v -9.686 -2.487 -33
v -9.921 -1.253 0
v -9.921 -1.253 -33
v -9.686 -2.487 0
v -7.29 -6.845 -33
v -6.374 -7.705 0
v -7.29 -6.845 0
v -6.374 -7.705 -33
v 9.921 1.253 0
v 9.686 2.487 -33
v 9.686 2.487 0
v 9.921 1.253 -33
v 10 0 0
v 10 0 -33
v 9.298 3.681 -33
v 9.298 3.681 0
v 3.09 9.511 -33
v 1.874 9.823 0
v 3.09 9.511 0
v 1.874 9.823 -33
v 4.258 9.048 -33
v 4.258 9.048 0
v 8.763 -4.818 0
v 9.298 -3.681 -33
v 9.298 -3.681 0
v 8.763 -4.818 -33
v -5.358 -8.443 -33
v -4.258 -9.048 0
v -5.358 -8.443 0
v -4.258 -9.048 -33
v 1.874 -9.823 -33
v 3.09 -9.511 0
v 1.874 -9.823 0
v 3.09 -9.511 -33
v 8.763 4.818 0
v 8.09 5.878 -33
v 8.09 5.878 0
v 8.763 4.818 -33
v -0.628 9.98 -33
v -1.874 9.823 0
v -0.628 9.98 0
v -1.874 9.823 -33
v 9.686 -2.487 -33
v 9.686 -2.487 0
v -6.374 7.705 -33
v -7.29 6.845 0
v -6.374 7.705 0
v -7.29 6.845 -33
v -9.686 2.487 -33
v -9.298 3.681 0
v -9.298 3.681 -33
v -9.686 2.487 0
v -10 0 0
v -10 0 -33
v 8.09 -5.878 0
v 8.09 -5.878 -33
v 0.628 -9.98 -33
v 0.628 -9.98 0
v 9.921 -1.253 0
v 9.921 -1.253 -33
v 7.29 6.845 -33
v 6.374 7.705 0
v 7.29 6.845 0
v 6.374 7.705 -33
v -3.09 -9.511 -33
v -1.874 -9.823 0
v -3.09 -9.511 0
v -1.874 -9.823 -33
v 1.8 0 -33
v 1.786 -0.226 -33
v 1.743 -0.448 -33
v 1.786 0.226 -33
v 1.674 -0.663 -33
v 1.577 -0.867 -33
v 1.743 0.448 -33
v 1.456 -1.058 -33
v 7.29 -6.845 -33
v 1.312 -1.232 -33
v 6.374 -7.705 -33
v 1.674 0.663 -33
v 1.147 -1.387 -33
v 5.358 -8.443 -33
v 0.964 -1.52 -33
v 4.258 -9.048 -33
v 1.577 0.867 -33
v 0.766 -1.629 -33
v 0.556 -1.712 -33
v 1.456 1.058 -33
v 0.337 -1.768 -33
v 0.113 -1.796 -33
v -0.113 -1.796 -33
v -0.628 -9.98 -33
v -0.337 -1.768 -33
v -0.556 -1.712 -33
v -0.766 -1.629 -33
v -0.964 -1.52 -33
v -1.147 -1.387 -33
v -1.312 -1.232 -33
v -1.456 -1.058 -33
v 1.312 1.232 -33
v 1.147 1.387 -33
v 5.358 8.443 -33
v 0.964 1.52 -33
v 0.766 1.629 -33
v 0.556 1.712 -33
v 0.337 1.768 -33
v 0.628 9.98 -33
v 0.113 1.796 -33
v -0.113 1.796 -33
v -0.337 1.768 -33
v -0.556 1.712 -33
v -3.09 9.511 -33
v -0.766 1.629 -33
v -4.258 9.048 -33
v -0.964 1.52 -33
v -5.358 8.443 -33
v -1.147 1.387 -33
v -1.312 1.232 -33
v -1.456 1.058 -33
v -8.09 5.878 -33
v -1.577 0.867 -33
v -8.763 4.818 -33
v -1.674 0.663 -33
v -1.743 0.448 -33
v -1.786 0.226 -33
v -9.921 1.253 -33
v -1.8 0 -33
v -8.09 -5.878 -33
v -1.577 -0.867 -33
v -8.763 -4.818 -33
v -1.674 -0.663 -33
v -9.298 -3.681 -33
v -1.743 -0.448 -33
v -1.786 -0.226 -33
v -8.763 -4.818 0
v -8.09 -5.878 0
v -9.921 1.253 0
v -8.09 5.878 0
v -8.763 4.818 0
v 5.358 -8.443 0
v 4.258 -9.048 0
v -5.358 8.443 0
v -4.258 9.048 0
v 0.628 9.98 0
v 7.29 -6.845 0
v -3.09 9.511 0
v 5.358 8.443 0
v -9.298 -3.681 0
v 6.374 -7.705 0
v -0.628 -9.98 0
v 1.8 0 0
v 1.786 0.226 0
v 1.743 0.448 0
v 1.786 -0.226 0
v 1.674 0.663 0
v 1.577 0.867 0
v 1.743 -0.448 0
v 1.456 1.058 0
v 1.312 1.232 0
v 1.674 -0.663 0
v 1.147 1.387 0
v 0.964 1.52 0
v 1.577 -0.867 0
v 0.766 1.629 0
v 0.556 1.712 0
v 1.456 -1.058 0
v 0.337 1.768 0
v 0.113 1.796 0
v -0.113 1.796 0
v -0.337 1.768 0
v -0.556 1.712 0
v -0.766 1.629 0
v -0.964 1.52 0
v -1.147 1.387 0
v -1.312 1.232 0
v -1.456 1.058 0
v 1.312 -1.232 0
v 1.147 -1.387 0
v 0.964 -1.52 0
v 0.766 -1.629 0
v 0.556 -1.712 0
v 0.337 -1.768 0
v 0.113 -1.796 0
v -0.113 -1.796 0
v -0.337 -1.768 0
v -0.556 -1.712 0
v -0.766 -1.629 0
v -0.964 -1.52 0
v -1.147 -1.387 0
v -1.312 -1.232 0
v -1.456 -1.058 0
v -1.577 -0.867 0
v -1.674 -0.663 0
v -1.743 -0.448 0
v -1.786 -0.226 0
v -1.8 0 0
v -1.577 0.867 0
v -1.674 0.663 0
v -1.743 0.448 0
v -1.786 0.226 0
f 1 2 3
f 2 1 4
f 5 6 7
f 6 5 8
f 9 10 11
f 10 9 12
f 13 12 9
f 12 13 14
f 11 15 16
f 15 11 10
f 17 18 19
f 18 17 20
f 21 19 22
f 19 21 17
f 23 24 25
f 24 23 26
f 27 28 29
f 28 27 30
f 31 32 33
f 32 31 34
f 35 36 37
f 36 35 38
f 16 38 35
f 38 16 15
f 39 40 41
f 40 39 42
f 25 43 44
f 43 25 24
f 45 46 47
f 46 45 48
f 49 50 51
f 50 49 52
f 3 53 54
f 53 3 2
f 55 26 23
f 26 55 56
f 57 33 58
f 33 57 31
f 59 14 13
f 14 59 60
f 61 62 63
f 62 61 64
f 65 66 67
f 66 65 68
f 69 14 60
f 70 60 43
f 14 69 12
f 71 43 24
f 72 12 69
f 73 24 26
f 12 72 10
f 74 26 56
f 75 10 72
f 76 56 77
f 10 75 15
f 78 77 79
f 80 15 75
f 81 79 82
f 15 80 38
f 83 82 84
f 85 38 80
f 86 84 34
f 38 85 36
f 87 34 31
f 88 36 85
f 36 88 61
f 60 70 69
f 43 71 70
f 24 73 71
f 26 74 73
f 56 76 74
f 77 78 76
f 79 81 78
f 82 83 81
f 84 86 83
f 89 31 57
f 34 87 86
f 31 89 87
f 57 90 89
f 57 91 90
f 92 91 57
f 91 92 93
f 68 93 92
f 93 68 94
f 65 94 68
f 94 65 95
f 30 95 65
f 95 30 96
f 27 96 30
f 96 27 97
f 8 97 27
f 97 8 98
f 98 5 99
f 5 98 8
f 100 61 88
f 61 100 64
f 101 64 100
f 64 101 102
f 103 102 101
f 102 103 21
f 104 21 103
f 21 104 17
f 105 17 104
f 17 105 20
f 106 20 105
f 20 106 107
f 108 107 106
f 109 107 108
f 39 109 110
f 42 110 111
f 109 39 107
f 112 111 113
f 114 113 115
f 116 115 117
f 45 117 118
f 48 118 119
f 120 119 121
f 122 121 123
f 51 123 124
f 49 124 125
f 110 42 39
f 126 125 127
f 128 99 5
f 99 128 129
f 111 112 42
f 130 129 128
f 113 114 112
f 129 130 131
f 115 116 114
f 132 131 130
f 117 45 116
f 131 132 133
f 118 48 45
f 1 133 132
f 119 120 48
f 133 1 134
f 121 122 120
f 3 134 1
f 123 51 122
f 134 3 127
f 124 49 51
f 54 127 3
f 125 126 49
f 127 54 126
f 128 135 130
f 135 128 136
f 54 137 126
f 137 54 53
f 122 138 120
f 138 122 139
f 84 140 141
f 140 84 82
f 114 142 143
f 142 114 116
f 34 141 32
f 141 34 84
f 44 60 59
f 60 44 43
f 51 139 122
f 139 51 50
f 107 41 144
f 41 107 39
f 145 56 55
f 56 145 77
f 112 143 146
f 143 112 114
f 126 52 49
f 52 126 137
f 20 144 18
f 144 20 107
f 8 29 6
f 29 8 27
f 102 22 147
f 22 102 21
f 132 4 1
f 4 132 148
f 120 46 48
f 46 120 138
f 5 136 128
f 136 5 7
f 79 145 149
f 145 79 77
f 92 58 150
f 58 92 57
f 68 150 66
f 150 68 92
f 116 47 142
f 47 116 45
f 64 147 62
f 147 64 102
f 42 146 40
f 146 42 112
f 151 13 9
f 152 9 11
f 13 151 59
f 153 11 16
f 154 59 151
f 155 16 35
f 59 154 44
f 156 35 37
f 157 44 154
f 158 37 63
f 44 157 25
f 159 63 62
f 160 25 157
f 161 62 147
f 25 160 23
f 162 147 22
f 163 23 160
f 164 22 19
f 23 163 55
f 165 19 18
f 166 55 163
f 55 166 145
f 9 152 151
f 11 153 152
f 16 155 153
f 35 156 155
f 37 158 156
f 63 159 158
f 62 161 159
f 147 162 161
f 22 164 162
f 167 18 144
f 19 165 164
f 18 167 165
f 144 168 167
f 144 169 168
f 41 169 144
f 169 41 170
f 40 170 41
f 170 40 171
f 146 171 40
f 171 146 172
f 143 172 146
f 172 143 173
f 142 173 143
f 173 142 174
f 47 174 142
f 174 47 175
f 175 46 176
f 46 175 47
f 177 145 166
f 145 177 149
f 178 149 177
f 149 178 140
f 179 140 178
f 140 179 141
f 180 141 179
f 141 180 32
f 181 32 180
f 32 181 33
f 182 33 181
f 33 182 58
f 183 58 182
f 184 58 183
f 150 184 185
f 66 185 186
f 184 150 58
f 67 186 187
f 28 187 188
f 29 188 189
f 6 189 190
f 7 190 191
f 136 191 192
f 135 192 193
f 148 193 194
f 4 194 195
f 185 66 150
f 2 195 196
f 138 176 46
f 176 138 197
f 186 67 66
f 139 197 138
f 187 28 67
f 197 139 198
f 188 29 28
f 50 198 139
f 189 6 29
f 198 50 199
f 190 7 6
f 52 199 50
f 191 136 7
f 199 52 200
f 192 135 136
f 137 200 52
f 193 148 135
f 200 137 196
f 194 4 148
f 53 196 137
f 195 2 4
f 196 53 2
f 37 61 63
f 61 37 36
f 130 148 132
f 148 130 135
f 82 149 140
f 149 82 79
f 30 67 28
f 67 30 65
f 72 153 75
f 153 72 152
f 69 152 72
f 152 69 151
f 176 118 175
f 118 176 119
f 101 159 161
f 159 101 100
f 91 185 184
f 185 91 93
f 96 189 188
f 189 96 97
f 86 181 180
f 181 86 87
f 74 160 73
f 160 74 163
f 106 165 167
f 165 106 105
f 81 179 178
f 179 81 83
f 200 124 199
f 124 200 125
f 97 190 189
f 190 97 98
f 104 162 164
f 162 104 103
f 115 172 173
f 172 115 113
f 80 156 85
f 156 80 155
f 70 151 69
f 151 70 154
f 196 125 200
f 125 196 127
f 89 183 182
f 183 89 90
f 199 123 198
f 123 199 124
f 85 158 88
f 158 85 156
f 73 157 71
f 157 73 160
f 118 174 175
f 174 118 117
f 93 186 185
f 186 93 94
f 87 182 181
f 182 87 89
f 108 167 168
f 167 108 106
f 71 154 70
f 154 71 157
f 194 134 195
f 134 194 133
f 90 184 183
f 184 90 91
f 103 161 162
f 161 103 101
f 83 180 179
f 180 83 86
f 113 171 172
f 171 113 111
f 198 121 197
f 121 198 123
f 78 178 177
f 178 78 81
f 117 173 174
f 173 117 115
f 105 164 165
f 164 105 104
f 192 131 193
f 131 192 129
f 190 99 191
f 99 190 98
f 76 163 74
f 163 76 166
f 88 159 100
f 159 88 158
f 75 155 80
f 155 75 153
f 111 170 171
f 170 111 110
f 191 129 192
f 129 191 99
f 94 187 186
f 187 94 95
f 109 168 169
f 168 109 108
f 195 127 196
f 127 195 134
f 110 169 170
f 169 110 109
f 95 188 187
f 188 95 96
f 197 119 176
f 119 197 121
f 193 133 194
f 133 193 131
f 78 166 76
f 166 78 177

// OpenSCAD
$fn = 50;


difference() {
	union() {
		translate(v = [0, 0, -33.0000000000]) {
			cylinder(h = 33, r = 10.0000000000);
		}
		cylinder(h = 0, r = 20.0000000000);
	}
	union() {
		#translate(v = [0, 0, -33]) {
			cylinder(h = 33, r = 1.8000000000);
		}
	}
}
